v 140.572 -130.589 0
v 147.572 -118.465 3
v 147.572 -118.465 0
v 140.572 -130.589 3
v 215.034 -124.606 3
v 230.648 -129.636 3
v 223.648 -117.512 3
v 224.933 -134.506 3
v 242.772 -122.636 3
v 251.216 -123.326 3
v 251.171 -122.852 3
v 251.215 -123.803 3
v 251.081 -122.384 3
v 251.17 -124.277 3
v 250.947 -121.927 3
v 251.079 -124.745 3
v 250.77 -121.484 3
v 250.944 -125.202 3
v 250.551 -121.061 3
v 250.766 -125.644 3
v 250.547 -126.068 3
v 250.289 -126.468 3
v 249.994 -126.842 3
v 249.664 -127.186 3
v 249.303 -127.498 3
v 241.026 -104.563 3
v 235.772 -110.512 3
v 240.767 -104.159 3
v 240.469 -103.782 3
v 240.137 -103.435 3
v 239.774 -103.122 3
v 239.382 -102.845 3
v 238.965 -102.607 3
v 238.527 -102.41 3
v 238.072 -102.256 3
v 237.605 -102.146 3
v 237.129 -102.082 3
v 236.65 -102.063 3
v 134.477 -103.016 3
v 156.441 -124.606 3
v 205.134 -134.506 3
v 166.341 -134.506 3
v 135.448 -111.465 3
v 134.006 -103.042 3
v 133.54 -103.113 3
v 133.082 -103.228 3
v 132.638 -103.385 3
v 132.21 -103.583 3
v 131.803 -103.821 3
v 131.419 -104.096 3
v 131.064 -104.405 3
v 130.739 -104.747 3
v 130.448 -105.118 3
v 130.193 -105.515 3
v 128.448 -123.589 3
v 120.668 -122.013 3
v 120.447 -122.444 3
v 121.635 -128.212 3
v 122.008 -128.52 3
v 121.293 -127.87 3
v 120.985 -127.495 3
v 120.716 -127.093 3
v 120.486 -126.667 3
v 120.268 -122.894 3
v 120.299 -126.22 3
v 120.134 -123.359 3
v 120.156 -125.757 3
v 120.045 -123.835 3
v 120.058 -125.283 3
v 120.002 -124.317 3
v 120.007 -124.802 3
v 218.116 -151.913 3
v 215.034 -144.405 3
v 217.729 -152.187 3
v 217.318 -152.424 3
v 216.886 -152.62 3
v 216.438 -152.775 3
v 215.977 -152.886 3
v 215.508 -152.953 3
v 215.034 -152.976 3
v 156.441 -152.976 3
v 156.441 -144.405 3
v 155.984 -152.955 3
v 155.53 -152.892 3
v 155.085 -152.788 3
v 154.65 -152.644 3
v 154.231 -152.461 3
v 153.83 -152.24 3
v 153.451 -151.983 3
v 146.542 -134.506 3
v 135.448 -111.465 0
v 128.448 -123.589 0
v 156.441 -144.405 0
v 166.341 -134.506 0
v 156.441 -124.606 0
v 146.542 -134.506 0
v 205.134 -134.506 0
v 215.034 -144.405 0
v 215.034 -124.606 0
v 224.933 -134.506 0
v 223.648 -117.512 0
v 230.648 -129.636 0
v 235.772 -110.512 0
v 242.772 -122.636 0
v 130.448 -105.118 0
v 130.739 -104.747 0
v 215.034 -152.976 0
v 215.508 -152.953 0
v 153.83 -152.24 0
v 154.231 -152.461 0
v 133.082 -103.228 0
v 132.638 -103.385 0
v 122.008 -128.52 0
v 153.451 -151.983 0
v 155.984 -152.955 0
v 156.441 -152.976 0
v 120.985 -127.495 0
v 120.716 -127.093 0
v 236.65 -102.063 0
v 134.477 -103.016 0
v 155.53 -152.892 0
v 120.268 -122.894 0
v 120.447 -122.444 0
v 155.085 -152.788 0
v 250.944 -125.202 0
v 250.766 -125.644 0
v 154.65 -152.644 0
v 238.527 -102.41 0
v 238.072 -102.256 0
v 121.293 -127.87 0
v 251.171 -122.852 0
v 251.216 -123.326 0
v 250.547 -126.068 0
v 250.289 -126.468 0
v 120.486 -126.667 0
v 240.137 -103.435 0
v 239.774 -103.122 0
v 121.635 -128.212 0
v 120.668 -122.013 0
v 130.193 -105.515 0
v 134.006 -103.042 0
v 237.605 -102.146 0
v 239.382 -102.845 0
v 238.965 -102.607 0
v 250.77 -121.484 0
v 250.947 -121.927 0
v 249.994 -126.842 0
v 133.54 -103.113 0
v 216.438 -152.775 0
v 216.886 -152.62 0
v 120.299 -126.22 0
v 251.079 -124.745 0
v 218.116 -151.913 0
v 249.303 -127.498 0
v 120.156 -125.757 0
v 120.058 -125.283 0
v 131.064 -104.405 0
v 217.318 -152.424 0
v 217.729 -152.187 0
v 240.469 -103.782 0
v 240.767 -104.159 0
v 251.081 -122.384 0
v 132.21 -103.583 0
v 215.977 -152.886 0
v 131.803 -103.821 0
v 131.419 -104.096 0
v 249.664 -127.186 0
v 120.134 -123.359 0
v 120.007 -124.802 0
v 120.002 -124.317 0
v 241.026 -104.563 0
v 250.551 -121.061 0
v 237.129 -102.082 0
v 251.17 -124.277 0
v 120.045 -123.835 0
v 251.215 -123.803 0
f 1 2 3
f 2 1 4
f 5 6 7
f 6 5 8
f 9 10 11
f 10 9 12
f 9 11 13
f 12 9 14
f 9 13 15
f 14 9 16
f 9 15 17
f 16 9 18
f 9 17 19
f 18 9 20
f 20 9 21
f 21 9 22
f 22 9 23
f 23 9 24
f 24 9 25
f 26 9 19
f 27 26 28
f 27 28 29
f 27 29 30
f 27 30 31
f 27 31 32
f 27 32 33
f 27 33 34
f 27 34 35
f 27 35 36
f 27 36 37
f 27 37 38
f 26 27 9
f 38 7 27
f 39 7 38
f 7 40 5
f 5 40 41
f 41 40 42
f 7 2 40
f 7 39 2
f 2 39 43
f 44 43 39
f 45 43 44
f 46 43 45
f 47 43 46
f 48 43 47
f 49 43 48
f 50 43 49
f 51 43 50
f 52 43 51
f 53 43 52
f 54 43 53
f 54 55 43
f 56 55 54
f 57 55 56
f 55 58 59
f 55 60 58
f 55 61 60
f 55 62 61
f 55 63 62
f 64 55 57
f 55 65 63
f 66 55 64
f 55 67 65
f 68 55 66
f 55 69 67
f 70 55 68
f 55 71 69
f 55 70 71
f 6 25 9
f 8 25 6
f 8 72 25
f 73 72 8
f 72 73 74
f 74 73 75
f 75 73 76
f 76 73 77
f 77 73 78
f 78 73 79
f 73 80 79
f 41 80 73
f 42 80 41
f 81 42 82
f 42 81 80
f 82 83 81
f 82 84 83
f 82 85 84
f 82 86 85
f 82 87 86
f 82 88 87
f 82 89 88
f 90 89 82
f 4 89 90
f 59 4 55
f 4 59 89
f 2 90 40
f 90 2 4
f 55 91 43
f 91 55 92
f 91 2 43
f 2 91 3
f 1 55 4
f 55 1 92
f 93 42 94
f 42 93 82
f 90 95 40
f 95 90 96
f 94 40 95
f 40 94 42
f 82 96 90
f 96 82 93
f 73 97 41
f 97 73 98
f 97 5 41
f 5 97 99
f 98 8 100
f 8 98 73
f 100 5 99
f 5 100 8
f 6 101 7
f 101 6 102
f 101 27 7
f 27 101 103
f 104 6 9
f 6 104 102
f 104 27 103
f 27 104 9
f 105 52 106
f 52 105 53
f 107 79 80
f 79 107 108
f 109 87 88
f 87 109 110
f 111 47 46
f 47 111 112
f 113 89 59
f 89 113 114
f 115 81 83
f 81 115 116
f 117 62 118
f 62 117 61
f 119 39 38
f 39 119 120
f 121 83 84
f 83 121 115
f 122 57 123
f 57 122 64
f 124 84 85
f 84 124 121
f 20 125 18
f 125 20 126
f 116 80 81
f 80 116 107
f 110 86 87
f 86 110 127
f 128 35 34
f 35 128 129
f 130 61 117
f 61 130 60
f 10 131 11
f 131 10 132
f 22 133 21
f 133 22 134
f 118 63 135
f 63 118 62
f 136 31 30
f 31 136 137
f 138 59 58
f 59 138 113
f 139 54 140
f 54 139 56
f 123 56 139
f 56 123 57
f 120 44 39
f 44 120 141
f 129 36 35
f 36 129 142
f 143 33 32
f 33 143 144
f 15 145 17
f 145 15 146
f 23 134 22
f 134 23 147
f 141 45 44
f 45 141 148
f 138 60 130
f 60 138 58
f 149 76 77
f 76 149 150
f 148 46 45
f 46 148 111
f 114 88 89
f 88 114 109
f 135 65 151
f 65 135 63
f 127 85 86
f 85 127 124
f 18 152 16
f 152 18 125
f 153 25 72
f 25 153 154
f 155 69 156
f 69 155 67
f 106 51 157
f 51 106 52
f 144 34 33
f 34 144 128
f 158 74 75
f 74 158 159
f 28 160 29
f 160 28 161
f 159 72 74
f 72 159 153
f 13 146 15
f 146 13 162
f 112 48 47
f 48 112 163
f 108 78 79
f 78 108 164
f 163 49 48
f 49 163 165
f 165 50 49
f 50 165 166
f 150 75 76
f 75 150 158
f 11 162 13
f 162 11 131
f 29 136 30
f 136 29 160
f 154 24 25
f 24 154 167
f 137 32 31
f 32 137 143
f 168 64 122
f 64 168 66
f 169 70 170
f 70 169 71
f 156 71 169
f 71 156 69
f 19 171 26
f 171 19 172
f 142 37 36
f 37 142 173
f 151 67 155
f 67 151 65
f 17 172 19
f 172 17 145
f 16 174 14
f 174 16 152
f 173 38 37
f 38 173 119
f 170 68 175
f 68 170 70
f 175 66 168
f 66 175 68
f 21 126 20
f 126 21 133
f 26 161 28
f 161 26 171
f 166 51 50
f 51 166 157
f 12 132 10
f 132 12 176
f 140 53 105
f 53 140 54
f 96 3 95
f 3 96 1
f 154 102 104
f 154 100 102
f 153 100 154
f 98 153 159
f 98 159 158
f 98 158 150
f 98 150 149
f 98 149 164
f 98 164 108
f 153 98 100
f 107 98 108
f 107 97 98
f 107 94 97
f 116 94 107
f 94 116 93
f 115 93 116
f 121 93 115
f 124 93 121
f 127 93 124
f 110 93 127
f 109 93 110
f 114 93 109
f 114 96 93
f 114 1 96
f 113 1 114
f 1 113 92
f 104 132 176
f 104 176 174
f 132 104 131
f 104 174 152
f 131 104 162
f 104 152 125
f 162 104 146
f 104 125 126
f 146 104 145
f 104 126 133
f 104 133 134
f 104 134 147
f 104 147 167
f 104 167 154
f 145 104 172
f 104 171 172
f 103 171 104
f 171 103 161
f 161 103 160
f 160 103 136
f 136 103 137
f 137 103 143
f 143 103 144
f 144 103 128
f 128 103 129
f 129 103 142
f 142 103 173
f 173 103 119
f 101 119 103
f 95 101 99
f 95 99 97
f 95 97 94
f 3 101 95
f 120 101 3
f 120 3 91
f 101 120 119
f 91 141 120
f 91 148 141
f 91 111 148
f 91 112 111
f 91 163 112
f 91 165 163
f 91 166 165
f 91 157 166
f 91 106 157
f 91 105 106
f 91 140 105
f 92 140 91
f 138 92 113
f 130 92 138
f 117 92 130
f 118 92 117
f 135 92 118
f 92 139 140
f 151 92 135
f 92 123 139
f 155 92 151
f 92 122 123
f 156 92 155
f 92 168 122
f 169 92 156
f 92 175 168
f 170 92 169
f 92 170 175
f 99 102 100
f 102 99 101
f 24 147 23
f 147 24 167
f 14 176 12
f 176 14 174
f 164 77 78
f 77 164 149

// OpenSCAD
$fn = $preview ? 0 : 100;


difference(){
	difference() {
		union() {
			linear_extrude(height = 3) {
				polygon(points = [[218.11603986601753, -151.91300500712072], [217.72916527407276, -152.18730974757293], [217.3180423169555, -152.4237266561437], [216.88636970412827, -152.62012878409018], [216.4380310221194, -152.77474917970972], [215.97705979544222, -152.88619678490036], [215.50760319858193, -152.95346894995663], [215.0338847455189, -152.97596045400934], [156.44111525448116, -152.9759604540093], [155.98384611887474, -152.95500704322916], [155.5304095224825, -152.89232242905803], [155.0846058826112, -152.78843199408402], [154.6501716419783, -152.64420648189122], [154.23074795222414, -152.4608546990404], [153.82985015609367, -152.23991338362092], [153.45083832406814, -151.98323432528886], [122.00825146379636, -128.52039022205904], [121.63462555892865, -128.21232676852952], [121.29255298302405, -127.86956480885088], [120.98524236874685, -127.4953194420909], [120.71557628238418, -127.09310108093047], [120.48608418544246, -126.66668252407577], [120.29891870835836, -126.22006356749576], [120.15583545887627, -125.75743348643056], [120.0581765544892, -125.28313174008899], [120.00685803340846, -124.80160726762385], [120.00236126214698, -124.317376757188], [120.04472842031271, -123.83498227950639], [120.13356210496502, -123.35894868336024], [120.26802905824476, -122.8937411526125], [120.44686798331335, -122.443723322889], [120.66840137528719, -122.0131163507795], [130.1934013752872, -105.51533240868596], [130.4481921902964, -105.11850054869201], [130.73923619927, -104.7474381963038], [131.06394434589916, -104.40544623143919], [131.4194281059413, -104.09556693095979], [131.80252518282526, -103.82055690532023], [132.20982763866797, -103.58286257643587], [132.63771221045633, -103.38459841491186], [133.08237254170842, -103.2275281302299], [133.53985304288994, -103.11304898122009], [134.00608407937088, -103.04217934638824], [134.4769181738998, -103.0155496646697], [236.6496397796904, -102.06304966466972], [237.12933198345925, -102.08162372046552], [237.60503204433158, -102.14611447942661], [238.0723549666451, -102.25592746675352], [238.5269929750687, -102.41005042806015], [238.9647552236076, -102.6070626603187], [239.3816064267555, -102.8451481078779], [239.77370405669294, -103.12211210283527], [240.13743376364815, -103.4354015954513], [240.46944269291612, -103.78212868812167], [240.76667039142058, -104.1590972559719], [241.02637701892218, -104.56283240868598], [250.55137701892218, -121.06061635077954], [250.7697140646319, -121.48420727433235], [250.94673280163883, -121.92666032584633], [251.0808251893566, -122.38395625585414], [251.17077313073267, -122.85194098198073], [251.21575953745858, -123.32636332468337], [251.2153757524109, -123.80291362502385], [251.16962526189818, -124.27726289366818], [251.07892366399116, -124.74510213548388], [250.94409489322447, -125.20218149250967], [250.7663637359641, -125.64434884972235], [250.5473447044316, -126.06758755290548], [250.28902737045345, -126.46805289599024], [249.99375829216376, -126.84210704641704], [249.6642196978387, -127.18635209125547], [249.30340512049864, -127.49766090389092], [218.11603986601753, -151.91300500712072]]);
			}
		}
	}
	/* Holes Below*/
	union(){
		translate(v = [138.0099203653, -121.0267243797, 0]) {
			rotate(a = -30) {
				cube(center = true, size = [14, 14, 6]);
			}
		}
		translate(v = [156.4411152545, -134.5055762724, 0]) {
			rotate(a = -45) {
				cube(center = true, size = [14, 14, 6]);
			}
		}
		translate(v = [215.0338847455, -134.5055762724, 0]) {
			rotate(a = 45) {
				cube(center = true, size = [14, 14, 6]);
			}
		}
		translate(v = [233.2098580290, -120.0742243797, 0]) {
			rotate(a = 30) {
				cube(center = true, size = [14, 14, 6]);
			}
		}
	} /* End Holes */ 
}
